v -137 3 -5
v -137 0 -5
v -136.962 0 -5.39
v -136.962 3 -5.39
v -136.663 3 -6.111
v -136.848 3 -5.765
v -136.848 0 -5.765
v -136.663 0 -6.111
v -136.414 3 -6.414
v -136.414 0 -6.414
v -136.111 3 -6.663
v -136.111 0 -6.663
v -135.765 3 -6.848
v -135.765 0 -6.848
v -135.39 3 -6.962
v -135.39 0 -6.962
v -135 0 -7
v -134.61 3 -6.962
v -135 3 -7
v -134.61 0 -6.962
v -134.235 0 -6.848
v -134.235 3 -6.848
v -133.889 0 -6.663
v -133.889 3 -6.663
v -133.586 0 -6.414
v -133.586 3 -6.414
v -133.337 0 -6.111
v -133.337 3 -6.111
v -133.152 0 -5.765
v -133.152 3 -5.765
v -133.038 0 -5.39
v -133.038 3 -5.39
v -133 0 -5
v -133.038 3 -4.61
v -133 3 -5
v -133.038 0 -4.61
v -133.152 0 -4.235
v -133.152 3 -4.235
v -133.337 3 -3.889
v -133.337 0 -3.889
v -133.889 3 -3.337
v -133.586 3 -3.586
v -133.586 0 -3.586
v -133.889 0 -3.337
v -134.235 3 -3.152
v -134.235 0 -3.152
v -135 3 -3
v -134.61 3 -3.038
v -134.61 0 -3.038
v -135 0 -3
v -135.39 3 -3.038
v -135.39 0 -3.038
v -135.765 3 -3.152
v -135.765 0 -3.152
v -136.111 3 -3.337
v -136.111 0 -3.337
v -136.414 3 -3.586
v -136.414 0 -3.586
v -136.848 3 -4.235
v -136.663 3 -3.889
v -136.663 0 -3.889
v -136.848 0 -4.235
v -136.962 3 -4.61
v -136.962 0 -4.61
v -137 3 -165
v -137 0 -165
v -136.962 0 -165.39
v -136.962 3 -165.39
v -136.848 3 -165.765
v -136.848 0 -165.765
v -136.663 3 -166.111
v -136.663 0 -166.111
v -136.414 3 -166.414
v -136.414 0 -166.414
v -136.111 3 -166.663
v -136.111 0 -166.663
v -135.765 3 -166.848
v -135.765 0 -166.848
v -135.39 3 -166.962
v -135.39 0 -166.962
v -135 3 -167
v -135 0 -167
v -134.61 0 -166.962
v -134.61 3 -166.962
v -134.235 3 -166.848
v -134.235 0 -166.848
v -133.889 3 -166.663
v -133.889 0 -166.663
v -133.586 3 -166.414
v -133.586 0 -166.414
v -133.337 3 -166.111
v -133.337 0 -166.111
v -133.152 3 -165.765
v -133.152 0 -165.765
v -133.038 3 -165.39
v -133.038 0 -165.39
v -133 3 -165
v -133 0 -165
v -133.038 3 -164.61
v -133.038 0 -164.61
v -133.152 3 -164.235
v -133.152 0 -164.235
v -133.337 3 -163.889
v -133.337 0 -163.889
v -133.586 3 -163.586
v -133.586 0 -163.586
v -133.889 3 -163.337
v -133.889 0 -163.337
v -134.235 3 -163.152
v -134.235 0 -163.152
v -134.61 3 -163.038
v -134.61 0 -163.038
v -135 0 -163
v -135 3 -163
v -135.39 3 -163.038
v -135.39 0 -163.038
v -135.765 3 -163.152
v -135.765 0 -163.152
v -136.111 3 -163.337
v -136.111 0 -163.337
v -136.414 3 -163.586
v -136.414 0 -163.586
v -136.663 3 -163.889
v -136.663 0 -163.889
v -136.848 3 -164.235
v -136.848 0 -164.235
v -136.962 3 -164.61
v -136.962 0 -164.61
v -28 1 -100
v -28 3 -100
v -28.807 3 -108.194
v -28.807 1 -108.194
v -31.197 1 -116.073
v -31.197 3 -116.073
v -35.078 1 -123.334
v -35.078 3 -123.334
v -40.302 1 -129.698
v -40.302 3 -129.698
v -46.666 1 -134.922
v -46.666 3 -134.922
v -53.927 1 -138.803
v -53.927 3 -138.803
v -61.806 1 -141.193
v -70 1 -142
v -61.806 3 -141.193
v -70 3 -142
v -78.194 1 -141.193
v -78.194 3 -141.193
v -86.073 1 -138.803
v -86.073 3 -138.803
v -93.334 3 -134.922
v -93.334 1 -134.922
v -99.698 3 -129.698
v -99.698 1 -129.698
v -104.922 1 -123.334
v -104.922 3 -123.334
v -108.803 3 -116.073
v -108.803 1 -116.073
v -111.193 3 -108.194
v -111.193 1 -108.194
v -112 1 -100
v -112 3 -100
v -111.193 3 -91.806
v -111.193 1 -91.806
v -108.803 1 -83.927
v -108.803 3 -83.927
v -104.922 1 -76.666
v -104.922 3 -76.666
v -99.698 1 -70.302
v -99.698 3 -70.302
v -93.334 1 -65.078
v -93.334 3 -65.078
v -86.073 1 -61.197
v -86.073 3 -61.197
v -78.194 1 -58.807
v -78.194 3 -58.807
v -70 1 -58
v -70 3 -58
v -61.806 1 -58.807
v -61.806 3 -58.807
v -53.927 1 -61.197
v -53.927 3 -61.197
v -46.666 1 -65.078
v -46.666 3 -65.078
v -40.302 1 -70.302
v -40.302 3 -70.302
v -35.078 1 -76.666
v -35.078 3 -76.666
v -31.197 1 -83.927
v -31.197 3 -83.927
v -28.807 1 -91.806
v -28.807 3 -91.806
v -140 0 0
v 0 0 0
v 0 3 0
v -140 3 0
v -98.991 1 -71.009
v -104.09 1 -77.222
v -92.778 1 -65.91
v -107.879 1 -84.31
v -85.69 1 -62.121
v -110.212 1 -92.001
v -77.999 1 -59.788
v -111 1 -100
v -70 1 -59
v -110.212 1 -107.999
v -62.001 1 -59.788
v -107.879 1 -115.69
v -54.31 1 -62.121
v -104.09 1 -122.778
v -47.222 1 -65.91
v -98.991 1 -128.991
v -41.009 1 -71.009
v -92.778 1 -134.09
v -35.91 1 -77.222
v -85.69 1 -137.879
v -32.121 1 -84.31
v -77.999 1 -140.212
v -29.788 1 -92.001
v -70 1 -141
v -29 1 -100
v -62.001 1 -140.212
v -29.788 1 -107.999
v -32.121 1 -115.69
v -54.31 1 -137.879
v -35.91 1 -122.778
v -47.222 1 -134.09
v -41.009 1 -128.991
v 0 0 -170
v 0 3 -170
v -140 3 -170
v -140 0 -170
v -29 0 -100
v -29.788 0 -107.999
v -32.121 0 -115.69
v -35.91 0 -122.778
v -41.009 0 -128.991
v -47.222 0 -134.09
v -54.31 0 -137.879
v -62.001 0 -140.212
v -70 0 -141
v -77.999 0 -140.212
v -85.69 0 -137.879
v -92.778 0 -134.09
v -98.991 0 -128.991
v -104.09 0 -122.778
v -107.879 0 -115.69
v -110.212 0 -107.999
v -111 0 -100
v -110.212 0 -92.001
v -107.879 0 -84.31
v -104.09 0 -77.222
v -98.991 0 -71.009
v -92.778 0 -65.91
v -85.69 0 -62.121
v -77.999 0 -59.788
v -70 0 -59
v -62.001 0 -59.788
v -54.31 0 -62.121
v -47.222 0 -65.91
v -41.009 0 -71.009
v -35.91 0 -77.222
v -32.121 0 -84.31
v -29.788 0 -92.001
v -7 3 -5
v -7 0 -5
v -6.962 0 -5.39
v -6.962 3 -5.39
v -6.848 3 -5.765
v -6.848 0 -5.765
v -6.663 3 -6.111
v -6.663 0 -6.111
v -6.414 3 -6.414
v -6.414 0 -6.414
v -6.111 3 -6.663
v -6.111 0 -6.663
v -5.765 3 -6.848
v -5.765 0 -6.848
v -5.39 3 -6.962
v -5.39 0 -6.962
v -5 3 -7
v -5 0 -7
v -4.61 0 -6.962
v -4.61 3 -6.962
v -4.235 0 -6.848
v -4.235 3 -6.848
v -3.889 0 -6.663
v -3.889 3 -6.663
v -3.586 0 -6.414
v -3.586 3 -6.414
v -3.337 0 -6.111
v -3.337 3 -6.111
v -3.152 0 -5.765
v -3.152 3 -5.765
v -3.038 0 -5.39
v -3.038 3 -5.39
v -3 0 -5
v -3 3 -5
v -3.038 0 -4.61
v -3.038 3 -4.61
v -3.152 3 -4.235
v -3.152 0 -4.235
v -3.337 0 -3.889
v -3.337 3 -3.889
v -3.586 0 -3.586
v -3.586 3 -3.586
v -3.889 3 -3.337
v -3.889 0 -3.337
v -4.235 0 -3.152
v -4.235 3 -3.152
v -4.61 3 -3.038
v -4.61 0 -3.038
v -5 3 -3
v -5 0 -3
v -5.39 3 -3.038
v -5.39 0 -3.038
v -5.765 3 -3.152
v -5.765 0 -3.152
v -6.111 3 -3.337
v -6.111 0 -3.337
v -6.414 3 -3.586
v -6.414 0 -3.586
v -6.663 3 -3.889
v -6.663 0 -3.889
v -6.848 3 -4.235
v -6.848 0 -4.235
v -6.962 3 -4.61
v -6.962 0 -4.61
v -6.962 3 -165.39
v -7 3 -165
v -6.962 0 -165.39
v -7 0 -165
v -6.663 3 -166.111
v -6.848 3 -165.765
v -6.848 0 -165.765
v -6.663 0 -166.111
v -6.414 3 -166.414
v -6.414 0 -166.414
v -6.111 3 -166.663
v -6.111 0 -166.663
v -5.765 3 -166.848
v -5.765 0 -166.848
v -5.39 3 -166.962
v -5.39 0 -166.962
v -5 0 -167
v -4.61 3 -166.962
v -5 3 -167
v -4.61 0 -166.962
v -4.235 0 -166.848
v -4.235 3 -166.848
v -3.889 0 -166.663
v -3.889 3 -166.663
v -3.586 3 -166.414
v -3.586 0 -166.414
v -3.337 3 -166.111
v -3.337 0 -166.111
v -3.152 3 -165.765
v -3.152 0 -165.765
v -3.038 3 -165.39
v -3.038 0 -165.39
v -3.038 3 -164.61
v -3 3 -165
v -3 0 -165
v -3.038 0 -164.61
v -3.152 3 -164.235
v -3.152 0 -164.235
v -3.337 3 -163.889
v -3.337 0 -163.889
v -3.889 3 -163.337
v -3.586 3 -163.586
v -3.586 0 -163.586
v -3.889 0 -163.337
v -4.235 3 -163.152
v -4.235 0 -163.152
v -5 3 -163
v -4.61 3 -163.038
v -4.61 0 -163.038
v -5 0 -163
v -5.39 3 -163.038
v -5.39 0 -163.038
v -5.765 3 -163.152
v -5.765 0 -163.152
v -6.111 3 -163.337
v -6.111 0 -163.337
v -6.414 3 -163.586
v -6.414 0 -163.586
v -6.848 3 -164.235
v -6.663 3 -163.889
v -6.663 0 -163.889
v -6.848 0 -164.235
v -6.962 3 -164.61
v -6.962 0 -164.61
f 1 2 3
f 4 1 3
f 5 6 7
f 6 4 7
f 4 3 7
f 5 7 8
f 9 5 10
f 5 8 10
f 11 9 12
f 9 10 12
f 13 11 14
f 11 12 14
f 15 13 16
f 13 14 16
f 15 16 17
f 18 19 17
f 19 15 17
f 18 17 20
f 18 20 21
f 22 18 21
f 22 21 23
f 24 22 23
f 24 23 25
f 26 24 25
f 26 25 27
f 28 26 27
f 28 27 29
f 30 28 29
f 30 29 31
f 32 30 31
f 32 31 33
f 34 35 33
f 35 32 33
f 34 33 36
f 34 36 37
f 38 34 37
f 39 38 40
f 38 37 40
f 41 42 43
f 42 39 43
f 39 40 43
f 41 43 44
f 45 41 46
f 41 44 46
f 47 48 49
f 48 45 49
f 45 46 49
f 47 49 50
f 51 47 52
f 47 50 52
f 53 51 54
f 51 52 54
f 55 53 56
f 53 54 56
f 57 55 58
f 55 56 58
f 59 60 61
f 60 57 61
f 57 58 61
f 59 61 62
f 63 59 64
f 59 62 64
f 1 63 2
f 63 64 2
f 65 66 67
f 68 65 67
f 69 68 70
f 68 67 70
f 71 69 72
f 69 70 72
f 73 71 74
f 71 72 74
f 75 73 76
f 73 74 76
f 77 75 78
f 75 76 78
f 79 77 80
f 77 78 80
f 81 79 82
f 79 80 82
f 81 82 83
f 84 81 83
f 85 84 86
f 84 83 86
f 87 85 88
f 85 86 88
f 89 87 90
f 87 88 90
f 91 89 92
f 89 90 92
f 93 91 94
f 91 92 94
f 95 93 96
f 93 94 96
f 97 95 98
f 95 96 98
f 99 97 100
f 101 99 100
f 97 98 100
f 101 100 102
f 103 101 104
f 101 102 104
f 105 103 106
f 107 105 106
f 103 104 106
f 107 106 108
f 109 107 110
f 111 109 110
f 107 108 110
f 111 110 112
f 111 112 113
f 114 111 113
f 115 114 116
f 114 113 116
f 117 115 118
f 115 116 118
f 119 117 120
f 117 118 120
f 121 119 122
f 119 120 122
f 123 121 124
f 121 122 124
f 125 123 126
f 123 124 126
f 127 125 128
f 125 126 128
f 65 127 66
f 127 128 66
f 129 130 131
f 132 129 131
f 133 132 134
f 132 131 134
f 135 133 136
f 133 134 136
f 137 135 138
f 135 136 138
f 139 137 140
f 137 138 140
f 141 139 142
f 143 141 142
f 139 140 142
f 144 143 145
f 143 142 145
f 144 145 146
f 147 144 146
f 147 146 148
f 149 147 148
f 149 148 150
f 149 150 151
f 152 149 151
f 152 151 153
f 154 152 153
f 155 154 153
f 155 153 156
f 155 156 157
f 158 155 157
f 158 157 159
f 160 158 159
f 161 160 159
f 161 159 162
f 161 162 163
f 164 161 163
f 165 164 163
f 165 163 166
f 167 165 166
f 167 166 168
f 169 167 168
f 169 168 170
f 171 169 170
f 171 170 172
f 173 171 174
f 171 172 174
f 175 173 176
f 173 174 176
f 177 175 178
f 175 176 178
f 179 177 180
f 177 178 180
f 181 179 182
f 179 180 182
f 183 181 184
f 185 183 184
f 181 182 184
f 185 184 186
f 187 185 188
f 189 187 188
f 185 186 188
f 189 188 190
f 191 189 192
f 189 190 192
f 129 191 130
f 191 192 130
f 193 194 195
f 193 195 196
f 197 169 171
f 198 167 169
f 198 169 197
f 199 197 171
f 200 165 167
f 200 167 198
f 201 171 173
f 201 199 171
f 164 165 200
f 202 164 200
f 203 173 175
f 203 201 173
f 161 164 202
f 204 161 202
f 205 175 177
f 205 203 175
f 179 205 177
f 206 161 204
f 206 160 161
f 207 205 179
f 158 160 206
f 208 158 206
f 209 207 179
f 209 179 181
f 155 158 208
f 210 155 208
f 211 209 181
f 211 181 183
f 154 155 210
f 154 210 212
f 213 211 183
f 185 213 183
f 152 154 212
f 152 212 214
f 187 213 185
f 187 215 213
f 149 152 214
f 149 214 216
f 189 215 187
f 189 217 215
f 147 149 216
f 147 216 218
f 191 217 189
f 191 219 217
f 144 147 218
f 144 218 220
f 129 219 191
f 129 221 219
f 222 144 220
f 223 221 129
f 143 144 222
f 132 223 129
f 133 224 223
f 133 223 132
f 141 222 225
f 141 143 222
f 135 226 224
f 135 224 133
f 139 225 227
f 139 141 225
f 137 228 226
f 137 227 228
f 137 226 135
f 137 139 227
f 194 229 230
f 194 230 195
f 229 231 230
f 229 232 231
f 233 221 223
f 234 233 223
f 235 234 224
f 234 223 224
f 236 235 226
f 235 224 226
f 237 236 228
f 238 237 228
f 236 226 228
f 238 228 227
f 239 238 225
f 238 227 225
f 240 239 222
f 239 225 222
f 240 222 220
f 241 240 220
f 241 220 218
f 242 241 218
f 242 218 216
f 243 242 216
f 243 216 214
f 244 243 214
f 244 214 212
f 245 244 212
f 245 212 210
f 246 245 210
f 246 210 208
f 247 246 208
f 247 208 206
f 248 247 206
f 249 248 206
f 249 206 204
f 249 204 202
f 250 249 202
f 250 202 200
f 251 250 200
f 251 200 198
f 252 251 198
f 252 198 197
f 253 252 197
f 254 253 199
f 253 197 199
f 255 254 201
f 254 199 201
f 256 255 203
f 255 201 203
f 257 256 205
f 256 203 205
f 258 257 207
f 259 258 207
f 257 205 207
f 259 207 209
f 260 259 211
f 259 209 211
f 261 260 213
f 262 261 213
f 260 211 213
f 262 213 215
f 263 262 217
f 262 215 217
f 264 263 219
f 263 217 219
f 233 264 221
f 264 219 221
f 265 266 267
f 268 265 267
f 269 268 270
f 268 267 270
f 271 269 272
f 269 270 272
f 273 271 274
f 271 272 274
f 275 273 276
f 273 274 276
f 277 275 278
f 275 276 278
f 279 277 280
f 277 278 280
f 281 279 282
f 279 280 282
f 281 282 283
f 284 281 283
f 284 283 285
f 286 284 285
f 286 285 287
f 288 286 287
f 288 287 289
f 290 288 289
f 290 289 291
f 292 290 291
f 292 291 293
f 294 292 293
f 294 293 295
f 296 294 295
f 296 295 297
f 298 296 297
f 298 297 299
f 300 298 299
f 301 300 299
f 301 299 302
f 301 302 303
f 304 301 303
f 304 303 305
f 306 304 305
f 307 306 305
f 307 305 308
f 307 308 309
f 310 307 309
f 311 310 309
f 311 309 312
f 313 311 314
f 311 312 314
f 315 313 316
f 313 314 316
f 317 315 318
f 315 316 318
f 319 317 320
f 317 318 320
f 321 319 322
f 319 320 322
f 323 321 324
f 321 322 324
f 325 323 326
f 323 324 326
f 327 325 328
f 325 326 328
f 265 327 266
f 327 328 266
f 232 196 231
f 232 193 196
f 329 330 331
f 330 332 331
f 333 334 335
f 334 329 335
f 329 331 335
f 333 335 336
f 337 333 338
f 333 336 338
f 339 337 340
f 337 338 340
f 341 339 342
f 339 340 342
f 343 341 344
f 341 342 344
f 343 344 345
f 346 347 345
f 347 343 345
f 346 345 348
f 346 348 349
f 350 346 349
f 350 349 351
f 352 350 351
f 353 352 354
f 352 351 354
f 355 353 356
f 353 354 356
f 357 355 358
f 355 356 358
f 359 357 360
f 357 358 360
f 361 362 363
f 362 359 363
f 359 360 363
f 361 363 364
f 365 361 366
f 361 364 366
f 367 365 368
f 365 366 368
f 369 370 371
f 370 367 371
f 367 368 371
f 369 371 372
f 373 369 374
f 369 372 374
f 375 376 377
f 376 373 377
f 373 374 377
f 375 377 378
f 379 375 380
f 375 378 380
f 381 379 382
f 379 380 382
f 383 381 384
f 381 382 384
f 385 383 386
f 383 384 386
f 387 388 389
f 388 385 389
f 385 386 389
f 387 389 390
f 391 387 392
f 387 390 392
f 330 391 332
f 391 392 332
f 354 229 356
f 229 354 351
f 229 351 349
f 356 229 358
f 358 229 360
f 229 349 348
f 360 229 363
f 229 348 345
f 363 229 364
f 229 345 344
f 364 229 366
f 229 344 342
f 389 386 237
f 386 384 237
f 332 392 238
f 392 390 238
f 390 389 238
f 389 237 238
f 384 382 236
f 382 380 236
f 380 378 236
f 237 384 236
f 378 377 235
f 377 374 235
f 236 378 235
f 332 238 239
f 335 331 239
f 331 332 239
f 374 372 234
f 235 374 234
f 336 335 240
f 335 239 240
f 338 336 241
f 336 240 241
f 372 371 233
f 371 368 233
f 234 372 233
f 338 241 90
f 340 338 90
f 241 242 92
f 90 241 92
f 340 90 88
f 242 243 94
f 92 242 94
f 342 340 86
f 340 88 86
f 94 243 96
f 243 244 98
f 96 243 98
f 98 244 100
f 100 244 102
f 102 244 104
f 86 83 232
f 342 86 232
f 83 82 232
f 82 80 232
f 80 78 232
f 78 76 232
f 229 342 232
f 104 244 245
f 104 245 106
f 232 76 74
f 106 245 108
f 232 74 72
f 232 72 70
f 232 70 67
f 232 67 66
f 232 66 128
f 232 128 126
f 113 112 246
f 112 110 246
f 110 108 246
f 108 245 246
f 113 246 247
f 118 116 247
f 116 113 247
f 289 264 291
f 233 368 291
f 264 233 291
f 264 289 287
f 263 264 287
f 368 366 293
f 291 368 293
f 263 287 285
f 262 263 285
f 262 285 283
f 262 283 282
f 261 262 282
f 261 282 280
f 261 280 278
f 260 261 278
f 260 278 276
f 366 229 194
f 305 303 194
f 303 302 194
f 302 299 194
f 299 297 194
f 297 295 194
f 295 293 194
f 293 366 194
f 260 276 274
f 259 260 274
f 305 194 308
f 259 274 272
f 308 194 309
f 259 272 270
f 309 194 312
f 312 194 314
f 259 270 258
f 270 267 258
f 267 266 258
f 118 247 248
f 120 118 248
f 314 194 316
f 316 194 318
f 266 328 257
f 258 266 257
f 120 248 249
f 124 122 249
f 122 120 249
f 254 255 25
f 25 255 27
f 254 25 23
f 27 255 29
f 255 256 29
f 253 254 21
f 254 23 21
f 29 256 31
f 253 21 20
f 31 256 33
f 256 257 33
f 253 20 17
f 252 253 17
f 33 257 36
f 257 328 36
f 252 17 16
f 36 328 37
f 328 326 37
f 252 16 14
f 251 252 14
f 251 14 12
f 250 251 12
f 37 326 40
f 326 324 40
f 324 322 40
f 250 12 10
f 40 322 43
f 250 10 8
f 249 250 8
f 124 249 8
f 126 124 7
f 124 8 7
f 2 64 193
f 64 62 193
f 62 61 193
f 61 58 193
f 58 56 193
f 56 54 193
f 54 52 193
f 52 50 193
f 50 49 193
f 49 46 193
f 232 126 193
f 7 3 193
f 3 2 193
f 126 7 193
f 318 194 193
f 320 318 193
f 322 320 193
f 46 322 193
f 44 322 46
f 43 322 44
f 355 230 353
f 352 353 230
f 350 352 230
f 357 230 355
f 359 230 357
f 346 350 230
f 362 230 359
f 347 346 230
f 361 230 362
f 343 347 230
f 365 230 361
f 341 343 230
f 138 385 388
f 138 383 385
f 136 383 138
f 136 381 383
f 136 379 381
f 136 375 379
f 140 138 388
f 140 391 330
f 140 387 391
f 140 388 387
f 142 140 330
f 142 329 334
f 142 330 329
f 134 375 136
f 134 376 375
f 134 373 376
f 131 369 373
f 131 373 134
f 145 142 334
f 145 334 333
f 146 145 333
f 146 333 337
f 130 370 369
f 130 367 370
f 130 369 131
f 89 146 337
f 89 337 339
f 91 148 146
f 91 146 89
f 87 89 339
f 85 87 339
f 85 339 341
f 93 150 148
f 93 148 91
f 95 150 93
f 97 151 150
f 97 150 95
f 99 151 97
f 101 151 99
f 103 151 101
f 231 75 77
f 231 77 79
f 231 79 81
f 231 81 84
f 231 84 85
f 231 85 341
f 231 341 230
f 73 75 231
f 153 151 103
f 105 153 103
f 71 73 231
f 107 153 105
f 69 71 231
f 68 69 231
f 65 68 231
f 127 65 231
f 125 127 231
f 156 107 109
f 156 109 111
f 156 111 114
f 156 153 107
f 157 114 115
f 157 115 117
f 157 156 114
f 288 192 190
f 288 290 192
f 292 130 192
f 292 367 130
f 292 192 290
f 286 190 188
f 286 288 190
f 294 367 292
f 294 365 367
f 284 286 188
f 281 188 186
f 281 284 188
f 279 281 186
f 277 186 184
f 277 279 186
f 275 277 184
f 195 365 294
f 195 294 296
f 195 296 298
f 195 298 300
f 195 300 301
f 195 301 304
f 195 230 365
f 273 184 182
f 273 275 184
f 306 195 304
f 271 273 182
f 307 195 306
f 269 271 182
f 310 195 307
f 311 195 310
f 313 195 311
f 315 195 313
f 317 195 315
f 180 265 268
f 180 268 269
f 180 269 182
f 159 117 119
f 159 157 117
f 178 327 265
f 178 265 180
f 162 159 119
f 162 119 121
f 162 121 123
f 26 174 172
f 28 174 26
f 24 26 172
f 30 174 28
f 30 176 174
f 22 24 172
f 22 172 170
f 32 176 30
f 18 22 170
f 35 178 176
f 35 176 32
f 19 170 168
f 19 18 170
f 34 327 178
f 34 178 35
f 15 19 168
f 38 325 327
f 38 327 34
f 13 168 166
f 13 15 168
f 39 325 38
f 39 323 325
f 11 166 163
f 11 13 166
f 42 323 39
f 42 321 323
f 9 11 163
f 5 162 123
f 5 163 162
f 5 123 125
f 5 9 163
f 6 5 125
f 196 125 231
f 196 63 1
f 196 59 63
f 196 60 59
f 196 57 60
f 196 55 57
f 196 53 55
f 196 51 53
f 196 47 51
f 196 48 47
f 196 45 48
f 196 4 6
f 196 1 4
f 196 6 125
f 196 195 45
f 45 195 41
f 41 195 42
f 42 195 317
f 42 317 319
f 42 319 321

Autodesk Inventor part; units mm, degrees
ref_plane "YZ Plane" through (0, 0, 0) normal (1, 0, 0) x (0, 1, 0)
ref_plane "XZ Plane" through (0, 0, 0) normal (0, 1, 0) x (-1, 0, 0)
ref_plane "XY Plane" through (0, 0, 0) normal (0, 0, 1) x (1, 0, 0)
sketch "Sketch1" plane through (0, 0, 0) normal (0, 1, 0) x (-1, 0, 0)
  line L0 (0, 0) -> (140, 0)
  line L1 (140, 0) -> (140, -170)
  line L2 (140, -170) -> (0, -170)
  line L3 (0, -170) -> (0, 0)
  line L4 (140, 0) -> (137.5, 0)
  line L5 (140, -2.5) -> (140, 0)
  line L6 (140, -170) -> (135, -170)
  line L7 (135, -170) -> (135, -165)
  line L8 (135, -165) -> (140, -165)
  line L9 (140, -165) -> (140, -170)
  circle A0 centre (135, -165) radius 2
  line L10 (0, 0) -> (5, 0)
  line L11 (5, 0) -> (5, -5)
  line L12 (5, -5) -> (0, -5)
  line L13 (0, -5) -> (0, 0)
  circle A1 centre (5, -5) radius 2
  circle A2 centre (5, -165) radius 2
  circle A3 centre (135, -5) radius 2
  dimension "d0" = 140
  dimension "d1" = 170
  dimension "d25" = 5
  dimension "d26" = 5
  dimension "d27" = 4
  dimension "d28" = 5
  dimension "d29" = 5
  dimension "d30" = 4
  dimension "d31" = 4
  dimension "d32" = 4
extrude "Extrusion5" add sketch "Sketch1" along normal blind 3 contours L0 L11 A1 L12 L3 | L0 L1 L8 A0 L7 L2 L3 L12 A1 L11 | L7 A0 L8 L1 L2
sketch "Sketch5" plane through (0, 3, 0) normal (0, 1, 0) x (1, 0, 0)
  line L0 (0, 170) -> (-140, 170) projected
  circle A0 centre (-70, 100) radius 41
  point P0 (0, 0)
  dimension "d36" = 82
extrude "Extrusion6" cut sketch "Sketch5" against normal blind 10
sketch "Sketch6" plane through (0, 3, 0) normal (0, 1, 0) x (1, 0, 0)
  circle A0 centre (-70, 100) radius 41 projected
  circle A1 centre (-70, 100) radius 41
  circle A2 centre (-70, 100) radius 42
  point P0 (0, 0)
  dimension "d39" = 84
extrude "Extrusion7" cut sketch "Sketch6" against normal blind 2
properties part number "back"
